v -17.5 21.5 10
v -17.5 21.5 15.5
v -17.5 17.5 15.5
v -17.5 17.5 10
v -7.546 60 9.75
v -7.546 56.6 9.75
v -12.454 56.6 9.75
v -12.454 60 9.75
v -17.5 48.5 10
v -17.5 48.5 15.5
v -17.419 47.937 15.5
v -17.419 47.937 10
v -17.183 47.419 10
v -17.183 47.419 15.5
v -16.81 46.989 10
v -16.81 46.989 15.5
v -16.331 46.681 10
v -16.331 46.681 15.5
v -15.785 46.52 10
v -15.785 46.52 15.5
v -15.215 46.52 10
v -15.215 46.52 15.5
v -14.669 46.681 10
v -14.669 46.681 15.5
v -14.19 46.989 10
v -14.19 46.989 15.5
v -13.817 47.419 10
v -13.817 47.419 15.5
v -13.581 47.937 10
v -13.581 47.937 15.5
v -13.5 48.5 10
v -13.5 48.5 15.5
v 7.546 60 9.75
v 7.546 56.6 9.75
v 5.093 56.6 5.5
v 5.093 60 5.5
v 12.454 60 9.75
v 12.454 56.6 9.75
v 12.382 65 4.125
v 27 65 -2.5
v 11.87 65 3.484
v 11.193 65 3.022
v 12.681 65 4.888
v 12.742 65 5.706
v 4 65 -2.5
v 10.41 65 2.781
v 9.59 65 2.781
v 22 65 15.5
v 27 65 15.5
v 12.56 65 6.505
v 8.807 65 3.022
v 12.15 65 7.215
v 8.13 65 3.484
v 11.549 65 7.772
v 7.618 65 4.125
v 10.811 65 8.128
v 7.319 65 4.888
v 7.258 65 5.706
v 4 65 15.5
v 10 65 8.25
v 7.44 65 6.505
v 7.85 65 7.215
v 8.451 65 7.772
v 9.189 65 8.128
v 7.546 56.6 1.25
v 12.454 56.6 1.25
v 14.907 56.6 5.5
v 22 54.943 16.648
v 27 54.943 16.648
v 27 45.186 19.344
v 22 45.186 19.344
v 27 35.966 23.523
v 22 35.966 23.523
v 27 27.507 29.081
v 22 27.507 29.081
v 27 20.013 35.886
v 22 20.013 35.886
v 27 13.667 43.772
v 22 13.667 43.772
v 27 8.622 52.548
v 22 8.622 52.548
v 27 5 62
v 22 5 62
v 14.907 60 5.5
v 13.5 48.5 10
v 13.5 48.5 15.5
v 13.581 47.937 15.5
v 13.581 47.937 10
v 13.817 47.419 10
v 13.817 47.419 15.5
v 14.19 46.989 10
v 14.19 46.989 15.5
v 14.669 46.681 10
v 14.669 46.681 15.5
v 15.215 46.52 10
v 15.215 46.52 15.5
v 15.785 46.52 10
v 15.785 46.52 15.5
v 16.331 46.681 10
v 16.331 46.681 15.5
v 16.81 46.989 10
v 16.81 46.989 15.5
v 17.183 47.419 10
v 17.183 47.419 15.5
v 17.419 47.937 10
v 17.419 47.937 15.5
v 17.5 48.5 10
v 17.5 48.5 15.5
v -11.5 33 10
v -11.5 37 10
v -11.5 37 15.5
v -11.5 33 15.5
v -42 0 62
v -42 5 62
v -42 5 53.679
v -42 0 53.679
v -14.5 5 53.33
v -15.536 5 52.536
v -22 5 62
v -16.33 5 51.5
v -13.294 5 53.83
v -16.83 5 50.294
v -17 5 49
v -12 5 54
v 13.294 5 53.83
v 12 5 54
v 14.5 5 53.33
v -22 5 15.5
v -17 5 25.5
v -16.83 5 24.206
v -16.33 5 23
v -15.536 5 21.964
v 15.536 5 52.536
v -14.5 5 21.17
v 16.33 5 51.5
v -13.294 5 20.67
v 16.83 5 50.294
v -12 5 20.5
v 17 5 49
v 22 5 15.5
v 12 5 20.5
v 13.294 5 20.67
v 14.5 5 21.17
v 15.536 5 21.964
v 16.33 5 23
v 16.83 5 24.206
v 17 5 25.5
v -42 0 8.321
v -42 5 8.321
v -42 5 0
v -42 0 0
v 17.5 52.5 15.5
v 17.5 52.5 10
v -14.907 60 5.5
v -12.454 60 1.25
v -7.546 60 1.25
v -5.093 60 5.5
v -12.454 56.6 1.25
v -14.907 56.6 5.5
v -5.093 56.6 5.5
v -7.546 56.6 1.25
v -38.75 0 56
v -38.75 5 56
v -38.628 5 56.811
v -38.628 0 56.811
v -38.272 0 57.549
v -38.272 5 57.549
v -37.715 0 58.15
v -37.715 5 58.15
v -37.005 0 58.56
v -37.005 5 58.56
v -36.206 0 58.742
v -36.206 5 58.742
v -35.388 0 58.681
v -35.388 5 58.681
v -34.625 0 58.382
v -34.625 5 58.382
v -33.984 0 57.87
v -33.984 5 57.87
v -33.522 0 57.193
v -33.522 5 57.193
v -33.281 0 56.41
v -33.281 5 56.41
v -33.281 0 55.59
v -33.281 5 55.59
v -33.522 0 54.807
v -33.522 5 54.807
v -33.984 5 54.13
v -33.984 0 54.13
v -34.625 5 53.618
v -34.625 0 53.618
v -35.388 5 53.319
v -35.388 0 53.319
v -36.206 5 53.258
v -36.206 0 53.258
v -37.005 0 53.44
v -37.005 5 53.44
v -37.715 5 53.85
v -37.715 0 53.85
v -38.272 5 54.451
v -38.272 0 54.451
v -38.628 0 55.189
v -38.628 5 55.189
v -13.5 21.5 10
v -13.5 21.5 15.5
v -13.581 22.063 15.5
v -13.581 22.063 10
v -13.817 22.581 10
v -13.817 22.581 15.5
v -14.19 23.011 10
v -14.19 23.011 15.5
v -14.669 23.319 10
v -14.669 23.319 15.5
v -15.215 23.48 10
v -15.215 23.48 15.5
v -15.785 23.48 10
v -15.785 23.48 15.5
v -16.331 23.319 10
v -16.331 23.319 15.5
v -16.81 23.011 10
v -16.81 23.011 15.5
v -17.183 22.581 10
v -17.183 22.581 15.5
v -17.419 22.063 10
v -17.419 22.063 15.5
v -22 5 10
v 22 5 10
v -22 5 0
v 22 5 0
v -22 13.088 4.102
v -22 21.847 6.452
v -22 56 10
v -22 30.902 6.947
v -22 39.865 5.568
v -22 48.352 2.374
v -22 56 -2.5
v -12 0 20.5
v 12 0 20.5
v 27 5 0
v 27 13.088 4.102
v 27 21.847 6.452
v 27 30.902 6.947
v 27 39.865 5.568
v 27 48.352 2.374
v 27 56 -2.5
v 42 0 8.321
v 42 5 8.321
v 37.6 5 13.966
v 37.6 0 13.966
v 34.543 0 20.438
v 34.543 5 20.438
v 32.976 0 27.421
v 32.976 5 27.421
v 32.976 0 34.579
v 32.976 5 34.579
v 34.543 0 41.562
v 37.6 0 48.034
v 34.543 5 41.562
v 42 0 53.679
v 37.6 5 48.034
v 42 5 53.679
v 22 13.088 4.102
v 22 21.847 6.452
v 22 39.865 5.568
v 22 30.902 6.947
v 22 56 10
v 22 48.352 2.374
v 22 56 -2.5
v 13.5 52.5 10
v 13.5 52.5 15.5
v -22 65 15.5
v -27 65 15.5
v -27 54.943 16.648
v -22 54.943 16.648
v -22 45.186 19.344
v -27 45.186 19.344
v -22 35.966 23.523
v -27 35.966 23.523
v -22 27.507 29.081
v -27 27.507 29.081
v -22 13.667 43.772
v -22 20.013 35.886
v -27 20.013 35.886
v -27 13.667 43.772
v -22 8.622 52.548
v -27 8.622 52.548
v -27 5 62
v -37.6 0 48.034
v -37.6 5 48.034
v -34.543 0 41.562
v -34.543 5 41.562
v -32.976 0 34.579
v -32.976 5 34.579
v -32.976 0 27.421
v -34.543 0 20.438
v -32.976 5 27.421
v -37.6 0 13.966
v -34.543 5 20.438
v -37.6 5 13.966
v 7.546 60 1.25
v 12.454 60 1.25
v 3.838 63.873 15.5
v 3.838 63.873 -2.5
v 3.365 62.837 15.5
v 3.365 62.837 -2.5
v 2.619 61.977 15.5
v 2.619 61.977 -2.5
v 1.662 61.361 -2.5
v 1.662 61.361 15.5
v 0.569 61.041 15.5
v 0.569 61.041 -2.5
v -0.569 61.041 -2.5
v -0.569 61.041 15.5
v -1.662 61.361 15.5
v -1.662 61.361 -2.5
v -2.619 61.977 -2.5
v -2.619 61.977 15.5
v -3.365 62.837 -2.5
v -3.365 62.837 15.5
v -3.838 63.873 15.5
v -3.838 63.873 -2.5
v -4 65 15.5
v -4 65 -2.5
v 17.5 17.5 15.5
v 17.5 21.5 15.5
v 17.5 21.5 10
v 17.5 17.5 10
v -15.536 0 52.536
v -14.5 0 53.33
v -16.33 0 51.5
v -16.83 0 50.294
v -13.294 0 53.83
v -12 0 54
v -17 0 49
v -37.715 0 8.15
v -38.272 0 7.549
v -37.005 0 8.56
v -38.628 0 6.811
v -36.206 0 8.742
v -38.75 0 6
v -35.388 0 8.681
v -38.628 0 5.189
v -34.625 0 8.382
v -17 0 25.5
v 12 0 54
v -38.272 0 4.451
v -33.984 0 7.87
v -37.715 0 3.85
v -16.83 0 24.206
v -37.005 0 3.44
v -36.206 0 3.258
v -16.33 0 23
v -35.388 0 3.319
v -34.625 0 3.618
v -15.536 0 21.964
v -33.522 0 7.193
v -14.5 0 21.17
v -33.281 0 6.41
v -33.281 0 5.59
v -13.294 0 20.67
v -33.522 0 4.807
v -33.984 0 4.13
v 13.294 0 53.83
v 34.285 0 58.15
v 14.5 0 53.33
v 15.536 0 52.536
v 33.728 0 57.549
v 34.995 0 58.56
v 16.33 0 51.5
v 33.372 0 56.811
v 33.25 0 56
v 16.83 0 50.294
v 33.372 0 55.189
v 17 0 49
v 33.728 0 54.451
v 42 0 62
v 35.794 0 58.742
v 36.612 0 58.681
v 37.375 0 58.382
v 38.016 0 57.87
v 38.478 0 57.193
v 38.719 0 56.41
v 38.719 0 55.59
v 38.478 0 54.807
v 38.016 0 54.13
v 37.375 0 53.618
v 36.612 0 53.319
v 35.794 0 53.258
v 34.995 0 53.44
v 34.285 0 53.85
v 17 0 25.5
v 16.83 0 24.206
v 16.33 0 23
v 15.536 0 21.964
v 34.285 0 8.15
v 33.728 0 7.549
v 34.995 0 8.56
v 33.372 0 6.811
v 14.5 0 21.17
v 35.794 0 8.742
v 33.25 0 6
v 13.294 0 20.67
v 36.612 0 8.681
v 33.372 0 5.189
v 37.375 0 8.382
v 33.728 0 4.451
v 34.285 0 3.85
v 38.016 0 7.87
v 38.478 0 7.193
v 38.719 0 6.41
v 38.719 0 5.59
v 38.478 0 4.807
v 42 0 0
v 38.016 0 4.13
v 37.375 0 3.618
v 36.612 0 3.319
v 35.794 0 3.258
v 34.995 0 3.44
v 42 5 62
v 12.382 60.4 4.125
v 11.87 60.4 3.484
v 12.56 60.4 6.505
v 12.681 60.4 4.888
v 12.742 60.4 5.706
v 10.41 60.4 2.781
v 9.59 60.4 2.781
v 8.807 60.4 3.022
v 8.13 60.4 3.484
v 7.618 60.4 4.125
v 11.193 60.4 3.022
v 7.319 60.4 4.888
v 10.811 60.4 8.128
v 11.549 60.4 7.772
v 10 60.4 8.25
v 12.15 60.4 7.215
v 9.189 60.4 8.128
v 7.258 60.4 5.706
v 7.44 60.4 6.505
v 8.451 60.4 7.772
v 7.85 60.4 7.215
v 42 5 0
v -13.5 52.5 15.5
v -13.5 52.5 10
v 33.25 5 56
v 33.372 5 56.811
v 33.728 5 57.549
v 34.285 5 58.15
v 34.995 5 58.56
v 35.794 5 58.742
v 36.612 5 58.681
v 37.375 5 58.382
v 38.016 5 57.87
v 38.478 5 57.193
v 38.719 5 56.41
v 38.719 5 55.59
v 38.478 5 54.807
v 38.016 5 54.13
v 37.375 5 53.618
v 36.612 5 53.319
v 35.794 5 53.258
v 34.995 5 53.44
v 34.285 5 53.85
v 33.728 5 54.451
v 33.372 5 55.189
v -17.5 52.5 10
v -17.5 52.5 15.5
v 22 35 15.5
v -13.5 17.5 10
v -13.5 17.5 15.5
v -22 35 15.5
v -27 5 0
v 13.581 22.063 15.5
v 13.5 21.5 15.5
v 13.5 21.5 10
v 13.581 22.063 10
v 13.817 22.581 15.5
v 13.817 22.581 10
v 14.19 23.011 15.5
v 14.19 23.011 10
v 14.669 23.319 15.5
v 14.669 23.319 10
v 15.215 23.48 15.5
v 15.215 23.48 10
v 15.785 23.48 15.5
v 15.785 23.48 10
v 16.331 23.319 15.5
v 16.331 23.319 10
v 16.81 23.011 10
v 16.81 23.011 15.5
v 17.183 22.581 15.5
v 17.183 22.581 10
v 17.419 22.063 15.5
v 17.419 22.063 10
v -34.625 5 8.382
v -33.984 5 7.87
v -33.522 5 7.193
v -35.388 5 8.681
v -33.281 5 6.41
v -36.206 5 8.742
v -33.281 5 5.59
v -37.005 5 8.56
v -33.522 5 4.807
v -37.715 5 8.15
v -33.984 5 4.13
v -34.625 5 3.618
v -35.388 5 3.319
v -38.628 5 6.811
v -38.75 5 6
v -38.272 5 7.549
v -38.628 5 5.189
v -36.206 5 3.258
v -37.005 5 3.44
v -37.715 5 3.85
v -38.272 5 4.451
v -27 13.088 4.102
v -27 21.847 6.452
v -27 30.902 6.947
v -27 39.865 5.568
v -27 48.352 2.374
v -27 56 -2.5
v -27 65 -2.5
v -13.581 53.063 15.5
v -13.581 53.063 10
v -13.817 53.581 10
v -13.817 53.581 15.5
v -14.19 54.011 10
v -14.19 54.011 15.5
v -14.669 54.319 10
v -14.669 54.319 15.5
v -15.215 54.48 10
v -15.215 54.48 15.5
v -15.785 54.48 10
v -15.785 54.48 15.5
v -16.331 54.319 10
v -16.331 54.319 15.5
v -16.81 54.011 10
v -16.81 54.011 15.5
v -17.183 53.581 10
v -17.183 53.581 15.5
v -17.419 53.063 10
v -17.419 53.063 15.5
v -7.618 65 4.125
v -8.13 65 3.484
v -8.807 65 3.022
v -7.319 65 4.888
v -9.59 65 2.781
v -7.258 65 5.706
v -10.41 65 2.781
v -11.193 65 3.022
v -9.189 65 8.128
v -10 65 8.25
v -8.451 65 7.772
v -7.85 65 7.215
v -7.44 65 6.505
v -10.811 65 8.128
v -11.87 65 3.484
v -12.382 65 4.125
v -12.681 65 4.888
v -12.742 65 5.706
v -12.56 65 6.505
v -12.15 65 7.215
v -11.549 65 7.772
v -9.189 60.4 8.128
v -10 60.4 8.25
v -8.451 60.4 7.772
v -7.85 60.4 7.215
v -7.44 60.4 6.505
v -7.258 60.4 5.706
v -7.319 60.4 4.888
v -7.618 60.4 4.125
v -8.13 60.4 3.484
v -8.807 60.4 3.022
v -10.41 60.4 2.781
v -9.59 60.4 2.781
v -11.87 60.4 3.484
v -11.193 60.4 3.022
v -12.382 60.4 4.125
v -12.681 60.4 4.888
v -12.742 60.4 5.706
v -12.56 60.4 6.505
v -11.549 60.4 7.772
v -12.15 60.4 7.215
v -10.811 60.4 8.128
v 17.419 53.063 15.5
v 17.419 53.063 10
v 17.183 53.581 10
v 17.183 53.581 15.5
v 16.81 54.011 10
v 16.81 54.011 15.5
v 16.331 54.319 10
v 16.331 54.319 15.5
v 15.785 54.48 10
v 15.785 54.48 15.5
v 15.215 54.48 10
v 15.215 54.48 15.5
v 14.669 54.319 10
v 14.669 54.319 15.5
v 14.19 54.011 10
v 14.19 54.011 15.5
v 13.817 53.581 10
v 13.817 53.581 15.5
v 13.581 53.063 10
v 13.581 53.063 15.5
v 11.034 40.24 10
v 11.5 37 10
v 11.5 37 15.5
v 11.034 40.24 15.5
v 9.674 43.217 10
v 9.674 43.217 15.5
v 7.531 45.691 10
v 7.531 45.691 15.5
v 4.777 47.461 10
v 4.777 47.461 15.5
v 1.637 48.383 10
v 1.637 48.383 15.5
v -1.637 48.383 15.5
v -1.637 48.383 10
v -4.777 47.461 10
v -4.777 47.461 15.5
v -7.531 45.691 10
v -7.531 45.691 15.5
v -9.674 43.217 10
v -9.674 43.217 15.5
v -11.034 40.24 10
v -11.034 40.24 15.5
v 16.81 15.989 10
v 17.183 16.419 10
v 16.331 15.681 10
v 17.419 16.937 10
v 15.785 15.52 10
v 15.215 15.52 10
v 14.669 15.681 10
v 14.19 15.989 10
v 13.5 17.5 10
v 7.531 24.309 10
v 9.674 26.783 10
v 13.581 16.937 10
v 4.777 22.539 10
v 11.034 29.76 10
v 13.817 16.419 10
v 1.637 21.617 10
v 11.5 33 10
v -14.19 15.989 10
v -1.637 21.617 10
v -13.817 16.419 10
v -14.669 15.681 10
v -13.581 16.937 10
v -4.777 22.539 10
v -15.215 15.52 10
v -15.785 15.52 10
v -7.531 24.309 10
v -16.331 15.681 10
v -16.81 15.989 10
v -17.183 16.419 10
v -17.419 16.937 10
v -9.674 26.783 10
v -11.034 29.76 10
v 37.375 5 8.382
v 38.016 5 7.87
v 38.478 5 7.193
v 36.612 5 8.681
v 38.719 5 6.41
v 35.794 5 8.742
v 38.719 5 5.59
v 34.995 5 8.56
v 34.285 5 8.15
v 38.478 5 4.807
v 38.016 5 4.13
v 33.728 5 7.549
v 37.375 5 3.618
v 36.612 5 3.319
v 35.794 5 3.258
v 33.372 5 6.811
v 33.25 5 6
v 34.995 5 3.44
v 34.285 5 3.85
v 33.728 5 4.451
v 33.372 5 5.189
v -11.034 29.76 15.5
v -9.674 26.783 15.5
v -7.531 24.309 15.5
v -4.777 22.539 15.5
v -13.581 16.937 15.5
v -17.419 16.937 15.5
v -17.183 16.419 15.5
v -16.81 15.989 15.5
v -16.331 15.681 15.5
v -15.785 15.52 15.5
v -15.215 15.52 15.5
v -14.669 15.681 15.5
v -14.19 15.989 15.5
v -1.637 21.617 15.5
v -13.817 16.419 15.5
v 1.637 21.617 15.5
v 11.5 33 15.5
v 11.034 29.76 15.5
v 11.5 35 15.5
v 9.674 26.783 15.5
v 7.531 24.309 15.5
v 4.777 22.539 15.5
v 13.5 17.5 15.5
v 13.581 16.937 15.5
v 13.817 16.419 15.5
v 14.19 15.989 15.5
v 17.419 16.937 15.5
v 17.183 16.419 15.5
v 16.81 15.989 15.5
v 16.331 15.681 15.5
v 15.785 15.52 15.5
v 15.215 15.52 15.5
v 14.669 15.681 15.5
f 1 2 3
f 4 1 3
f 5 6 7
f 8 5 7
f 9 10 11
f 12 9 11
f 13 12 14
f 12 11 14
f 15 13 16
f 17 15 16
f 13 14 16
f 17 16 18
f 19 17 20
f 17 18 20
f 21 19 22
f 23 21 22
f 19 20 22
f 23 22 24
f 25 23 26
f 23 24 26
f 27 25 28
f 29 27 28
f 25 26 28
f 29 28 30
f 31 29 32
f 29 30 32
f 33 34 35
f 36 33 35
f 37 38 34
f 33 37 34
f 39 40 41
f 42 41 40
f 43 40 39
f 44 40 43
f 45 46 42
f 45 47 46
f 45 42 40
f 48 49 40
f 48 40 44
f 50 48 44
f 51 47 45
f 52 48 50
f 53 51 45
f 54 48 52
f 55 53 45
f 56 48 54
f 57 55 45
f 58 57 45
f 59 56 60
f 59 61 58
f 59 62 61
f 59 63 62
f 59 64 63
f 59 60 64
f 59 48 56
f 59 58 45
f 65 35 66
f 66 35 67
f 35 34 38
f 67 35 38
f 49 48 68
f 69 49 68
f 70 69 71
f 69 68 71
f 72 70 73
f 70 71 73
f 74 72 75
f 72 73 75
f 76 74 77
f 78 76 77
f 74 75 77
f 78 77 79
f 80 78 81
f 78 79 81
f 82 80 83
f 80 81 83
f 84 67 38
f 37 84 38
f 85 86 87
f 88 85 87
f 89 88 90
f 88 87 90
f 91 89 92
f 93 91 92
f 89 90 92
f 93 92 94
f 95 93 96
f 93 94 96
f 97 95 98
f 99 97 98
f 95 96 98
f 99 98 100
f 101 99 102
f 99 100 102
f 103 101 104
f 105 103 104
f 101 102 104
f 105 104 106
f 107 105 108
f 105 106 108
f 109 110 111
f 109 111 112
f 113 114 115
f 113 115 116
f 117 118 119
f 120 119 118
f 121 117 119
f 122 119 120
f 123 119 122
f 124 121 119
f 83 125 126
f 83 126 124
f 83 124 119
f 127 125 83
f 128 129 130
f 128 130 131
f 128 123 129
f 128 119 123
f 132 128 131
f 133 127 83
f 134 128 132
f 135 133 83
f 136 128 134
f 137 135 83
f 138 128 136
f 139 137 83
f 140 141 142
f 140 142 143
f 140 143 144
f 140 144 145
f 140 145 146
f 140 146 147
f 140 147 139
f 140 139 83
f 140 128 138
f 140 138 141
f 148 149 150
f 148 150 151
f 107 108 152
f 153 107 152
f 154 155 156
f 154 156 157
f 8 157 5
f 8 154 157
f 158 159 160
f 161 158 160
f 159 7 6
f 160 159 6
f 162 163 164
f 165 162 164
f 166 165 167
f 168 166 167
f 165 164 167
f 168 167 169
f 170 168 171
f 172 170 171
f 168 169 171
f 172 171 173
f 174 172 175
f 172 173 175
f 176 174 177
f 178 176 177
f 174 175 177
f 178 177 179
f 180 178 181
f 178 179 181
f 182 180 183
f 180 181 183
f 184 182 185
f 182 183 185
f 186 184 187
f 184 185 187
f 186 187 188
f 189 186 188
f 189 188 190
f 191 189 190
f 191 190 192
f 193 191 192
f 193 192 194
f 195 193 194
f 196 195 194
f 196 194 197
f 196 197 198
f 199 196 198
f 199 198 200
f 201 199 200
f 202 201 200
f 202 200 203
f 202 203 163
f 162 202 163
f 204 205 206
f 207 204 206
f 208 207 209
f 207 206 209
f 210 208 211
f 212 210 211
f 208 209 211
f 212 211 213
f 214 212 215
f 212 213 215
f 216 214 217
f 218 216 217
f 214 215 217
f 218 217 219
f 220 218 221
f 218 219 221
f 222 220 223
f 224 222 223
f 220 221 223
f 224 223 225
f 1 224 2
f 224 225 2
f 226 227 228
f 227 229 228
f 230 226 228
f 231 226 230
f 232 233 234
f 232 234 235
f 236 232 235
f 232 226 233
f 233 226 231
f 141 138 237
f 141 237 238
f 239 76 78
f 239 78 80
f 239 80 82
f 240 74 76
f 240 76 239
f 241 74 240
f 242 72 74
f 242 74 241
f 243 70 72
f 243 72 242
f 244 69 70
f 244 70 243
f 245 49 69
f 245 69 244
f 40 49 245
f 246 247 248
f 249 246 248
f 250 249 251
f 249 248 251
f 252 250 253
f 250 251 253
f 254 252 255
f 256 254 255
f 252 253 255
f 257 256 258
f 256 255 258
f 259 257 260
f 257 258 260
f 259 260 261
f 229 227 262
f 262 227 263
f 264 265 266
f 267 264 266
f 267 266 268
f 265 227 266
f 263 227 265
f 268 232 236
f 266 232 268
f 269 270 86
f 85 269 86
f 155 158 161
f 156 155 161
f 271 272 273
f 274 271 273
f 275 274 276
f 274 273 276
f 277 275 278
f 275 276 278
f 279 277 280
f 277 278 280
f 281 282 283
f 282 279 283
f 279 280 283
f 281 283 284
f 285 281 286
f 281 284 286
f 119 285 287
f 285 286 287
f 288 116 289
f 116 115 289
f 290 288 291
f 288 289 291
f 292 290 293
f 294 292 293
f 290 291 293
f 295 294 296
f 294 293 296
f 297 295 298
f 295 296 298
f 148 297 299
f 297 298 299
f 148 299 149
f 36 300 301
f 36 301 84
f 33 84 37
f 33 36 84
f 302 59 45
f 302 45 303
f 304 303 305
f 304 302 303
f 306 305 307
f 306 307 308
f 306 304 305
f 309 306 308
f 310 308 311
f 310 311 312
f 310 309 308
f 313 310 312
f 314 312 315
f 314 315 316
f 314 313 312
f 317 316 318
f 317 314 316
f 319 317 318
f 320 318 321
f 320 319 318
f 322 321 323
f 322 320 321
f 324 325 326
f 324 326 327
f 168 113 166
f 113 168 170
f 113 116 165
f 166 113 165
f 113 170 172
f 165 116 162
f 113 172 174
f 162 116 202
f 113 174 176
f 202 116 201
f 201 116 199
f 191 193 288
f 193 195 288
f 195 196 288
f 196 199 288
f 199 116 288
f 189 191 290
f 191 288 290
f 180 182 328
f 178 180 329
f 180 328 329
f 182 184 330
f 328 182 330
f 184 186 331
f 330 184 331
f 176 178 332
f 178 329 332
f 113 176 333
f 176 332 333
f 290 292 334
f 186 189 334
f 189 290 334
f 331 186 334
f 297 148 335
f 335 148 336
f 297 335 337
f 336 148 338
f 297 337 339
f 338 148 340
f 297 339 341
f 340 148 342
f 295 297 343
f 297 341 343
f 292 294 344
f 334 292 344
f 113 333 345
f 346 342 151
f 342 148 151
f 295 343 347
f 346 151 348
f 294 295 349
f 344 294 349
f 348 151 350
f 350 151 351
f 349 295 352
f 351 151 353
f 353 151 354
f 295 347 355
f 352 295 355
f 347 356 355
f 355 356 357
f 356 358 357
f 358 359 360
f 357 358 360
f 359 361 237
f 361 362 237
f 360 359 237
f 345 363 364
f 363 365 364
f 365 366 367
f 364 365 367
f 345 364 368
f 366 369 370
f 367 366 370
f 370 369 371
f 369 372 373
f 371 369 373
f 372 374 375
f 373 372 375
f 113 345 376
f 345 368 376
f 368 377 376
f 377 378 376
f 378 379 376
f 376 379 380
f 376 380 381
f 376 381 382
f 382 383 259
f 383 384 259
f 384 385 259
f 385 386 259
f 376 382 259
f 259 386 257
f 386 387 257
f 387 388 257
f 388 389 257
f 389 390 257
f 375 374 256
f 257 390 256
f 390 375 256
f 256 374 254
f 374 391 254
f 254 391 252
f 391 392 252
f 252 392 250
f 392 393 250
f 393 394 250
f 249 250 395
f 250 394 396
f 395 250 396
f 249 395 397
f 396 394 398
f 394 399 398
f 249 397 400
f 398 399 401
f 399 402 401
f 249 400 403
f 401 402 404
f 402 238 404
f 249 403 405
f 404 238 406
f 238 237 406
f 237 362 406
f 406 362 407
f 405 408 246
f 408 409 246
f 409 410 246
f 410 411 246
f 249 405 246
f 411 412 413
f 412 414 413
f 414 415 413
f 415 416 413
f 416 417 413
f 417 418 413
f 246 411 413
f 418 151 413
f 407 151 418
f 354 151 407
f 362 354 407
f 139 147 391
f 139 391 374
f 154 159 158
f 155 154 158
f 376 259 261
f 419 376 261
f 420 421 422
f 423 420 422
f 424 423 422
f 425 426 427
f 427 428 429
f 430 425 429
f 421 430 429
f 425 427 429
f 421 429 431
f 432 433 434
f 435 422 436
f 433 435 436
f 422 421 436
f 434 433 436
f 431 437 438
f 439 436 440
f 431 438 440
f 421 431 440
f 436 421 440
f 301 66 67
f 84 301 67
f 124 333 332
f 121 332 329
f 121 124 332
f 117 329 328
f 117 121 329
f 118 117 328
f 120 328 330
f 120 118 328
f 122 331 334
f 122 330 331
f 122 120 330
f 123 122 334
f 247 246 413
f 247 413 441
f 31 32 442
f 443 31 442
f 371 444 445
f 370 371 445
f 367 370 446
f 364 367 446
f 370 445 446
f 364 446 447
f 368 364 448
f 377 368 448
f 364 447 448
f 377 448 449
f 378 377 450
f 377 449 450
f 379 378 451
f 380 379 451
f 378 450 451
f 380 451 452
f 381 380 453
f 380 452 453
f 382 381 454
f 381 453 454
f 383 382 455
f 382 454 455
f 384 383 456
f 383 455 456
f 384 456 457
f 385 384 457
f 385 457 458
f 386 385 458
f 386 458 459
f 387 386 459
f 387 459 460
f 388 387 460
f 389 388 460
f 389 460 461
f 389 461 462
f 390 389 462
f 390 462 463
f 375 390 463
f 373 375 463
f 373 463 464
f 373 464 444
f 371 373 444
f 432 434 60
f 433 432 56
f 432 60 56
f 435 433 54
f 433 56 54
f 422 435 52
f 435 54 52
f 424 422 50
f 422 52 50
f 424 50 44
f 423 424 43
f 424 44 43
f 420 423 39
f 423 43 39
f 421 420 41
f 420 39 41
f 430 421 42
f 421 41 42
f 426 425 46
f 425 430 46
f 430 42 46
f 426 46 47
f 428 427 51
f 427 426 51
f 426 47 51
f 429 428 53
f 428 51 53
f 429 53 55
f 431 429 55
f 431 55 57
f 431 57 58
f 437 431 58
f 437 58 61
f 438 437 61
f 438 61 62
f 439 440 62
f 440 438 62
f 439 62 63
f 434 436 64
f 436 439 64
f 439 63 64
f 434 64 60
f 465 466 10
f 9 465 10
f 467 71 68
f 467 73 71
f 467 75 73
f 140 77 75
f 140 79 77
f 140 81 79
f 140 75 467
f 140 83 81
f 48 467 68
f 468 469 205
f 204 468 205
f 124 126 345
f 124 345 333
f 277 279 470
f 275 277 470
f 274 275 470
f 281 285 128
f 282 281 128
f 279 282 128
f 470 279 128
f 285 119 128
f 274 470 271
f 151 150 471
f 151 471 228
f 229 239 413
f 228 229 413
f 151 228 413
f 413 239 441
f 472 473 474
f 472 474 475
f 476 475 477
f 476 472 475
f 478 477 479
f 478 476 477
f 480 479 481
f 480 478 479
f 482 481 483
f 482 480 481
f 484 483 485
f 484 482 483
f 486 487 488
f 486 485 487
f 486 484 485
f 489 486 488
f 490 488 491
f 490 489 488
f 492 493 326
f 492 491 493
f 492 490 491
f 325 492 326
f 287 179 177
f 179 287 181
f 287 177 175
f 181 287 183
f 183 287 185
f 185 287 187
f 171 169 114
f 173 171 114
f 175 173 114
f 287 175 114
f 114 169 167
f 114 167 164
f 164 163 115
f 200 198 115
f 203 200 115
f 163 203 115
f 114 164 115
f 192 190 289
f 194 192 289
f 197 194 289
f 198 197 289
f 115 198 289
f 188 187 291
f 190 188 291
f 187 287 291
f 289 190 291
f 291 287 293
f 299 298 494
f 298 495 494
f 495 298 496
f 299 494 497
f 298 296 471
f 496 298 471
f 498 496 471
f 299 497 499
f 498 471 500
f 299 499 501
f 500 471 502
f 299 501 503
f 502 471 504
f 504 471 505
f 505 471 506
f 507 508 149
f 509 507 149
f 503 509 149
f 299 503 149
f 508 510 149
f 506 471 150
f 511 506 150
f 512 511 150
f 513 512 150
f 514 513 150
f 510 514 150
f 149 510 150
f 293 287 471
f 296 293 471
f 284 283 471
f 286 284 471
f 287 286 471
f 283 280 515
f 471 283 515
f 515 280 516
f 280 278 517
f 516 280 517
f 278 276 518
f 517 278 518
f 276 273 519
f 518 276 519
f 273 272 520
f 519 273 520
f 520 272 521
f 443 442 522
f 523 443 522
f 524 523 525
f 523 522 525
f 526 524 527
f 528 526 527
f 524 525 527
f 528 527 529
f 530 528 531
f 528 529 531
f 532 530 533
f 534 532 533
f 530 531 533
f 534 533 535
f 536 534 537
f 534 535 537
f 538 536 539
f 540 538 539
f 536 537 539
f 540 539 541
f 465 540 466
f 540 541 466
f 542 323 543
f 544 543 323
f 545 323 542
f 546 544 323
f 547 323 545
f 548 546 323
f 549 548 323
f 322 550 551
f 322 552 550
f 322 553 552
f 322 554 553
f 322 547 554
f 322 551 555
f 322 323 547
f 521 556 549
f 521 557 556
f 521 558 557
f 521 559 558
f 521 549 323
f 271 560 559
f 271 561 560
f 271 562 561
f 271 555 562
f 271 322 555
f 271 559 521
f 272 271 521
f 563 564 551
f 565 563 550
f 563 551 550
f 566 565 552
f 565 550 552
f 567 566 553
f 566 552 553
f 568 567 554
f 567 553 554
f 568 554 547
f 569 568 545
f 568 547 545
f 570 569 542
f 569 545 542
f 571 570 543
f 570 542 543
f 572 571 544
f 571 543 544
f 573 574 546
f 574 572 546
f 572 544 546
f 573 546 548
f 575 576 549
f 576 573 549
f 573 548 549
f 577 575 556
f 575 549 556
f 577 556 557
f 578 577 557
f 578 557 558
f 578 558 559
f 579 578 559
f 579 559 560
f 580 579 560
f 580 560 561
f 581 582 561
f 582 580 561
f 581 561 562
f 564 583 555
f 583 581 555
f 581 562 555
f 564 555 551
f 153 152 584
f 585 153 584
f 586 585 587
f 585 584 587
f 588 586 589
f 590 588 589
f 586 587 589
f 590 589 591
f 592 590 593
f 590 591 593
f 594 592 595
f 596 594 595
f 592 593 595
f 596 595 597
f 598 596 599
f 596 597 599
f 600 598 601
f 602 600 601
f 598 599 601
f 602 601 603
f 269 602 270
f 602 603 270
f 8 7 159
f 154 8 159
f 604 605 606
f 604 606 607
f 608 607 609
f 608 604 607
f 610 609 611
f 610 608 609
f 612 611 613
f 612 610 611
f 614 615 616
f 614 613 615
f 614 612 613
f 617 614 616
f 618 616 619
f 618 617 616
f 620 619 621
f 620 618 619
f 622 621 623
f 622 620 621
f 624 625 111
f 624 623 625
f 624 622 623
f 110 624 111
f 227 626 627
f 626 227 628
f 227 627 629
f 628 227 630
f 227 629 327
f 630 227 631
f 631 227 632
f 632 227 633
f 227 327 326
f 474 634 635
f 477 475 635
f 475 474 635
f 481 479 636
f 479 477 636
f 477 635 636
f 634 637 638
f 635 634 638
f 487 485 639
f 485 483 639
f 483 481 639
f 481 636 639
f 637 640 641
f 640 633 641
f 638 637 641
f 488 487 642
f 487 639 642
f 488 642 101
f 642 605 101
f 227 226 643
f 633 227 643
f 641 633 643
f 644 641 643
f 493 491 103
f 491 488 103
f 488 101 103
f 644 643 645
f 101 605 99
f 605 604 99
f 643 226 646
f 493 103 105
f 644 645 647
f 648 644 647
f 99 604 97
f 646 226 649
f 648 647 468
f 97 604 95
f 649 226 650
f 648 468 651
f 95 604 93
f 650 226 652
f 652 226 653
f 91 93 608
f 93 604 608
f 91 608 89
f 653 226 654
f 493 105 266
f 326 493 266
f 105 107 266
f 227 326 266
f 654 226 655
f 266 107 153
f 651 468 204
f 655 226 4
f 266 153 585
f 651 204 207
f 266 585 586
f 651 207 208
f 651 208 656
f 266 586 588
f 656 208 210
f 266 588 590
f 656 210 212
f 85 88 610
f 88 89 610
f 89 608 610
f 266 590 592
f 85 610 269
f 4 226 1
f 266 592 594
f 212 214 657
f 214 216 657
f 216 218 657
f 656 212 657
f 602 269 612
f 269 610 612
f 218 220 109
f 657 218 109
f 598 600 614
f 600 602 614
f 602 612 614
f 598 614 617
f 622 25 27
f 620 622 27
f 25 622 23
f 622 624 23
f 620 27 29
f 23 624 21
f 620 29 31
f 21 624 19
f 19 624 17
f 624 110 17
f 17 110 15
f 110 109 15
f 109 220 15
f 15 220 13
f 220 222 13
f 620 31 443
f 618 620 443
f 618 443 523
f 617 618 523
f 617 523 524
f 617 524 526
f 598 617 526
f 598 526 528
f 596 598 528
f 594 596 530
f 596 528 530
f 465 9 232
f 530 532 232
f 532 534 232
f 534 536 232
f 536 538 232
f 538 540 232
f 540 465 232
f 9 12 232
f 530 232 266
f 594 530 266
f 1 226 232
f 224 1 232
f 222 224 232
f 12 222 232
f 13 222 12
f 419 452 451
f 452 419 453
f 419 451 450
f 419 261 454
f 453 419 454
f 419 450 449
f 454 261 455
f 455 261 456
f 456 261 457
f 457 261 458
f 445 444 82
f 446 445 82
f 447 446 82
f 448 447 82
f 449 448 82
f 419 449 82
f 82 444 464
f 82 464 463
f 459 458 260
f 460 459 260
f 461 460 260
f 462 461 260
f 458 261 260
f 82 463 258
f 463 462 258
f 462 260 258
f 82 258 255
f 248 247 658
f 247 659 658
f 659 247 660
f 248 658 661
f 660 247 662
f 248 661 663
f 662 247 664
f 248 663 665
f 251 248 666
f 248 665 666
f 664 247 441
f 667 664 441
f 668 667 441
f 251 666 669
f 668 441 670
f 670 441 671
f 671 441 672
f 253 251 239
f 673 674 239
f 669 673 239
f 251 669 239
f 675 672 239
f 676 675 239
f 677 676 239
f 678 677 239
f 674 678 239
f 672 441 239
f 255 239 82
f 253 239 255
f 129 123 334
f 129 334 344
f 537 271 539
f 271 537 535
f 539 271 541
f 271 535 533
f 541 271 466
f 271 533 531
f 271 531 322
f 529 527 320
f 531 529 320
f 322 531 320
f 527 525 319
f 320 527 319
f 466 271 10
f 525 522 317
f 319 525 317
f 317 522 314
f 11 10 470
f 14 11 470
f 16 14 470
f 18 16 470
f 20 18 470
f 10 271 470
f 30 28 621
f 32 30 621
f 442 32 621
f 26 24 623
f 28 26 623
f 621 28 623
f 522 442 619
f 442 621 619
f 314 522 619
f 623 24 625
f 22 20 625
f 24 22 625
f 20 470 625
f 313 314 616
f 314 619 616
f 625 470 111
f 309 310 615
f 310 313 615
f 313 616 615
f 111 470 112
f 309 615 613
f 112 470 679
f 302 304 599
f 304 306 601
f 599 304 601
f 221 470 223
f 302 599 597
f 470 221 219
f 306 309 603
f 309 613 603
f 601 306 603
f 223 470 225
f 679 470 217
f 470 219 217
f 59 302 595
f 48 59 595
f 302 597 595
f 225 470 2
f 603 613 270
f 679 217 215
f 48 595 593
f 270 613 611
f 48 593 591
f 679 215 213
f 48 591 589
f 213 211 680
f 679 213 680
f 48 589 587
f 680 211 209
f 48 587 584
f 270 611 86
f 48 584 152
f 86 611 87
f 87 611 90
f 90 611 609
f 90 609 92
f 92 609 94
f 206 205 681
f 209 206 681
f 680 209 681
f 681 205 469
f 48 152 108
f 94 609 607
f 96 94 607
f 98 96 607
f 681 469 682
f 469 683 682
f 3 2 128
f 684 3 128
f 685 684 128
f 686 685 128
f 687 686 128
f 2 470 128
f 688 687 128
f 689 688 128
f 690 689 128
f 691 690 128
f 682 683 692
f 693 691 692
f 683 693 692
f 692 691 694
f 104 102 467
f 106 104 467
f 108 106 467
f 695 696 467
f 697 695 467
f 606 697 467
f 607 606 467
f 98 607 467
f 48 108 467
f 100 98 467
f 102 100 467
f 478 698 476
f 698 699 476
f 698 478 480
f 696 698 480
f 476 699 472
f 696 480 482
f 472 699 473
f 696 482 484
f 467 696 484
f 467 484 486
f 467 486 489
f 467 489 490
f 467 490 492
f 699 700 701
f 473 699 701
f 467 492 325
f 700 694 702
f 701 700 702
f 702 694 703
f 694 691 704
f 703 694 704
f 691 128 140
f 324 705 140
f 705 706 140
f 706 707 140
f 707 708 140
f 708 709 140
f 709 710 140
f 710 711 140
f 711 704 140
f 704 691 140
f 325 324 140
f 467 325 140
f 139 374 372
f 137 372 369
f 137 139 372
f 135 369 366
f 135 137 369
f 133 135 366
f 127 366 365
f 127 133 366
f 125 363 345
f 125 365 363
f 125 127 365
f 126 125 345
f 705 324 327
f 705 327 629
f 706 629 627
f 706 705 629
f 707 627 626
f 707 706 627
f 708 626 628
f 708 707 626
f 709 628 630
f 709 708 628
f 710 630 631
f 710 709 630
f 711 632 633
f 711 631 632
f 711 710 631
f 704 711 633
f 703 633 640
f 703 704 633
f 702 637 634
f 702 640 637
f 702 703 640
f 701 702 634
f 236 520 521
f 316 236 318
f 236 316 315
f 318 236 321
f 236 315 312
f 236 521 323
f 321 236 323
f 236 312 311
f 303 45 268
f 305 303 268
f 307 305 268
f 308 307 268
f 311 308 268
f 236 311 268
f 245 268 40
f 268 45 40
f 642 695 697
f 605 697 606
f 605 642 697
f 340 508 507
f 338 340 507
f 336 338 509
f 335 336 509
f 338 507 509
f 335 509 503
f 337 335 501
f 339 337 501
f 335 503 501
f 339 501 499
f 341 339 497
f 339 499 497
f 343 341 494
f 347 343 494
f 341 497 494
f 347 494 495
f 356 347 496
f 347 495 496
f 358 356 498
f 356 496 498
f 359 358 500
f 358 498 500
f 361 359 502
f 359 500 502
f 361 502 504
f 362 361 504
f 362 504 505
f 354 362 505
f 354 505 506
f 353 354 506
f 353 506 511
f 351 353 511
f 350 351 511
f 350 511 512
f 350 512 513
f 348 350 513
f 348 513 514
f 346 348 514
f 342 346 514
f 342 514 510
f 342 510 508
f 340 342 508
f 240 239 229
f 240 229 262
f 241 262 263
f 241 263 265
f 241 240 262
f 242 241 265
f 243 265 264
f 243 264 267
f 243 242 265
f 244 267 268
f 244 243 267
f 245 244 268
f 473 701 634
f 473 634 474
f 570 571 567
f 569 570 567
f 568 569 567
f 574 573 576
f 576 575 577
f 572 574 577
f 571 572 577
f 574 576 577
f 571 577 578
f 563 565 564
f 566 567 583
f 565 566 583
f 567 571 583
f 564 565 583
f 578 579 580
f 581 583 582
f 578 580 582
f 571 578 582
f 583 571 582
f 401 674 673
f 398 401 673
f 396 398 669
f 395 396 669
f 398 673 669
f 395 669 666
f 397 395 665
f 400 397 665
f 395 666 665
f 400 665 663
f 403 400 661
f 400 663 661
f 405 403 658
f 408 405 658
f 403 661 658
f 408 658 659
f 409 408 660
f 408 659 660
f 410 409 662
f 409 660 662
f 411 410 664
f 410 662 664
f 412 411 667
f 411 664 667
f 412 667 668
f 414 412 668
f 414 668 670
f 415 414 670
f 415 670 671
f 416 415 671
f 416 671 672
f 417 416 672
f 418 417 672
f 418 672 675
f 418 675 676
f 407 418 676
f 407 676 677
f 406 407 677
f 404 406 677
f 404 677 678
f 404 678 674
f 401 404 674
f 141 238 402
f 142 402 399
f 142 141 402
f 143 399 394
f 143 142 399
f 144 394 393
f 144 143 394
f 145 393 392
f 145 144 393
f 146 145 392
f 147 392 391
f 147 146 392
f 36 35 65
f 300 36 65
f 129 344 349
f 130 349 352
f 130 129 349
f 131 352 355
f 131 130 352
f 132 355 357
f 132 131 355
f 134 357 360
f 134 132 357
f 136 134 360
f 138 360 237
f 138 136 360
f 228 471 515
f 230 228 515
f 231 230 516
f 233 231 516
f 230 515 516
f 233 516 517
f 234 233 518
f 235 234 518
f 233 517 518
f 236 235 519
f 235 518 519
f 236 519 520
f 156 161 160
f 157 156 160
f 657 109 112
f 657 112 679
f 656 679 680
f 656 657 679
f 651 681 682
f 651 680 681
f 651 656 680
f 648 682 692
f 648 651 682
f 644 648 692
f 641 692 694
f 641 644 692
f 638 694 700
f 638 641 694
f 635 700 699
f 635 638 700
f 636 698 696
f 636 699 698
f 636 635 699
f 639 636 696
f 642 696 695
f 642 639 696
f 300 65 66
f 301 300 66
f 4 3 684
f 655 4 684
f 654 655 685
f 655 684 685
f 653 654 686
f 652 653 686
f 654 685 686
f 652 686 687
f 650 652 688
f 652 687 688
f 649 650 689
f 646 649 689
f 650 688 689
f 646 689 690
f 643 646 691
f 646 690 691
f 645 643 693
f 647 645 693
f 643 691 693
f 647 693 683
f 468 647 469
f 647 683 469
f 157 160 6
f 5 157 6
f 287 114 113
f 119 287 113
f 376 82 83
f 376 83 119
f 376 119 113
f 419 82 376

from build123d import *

# Parameters (mm, degrees)
BOSS_EXTRUDE1_DEPTH = 62
SKETCH2_W           = 10
SKETCH2_H           = 60
CUT_EXTRUDE1_DEPTH  = 85
SKETCH12_W          = 44
SKETCH12_H          = 51.120506265
CUT_EXTRUDE11_DEPTH = 30
SKETCH17_R          = 2.75
SKETCH17_R_2        = 32.5
CUT_EXTRUDE14_DEPTH = 6
CUT_EXTRUDE17_DEPTH = 10
CUT_EXTRUDE18_DEPTH = 6
SKETCH24_W          = 44
SKETCH24_H          = 8.565563784
CUT_EXTRUDE19_DEPTH = 31.0000001
BOSS_EXTRUDE2_DEPTH = 12.5
BOSS_EXTRUDE3_DEPTH = 5
CUT_EXTRUDE20_START = -0.6
CUT_EXTRUDE20_DEPTH = 3.4
SKETCH29_R          = 2.75
CUT_EXTRUDE21_DEPTH = 6
SKETCH33_R          = 2.75
BOSS_EXTRUDE5_DEPTH = 0.4


with BuildPart() as part:
    # Sketch1 → Boss-Extrude1 (new body)
    with BuildSketch(Plane.XY):
        with BuildLine():
            Line((-42, 0), (42, 0))
            Line((42, 0), (42, 5))
            Line((42, 5), (27, 5))
            Line((27, 5), (27, 65))
            Line((27, 65), (4, 65))
            ThreePointArc((4, 65), (0, 61), (-4, 65))
            Line((-4, 65), (-27, 65))
            Line((-27, 65), (-27, 5))
            Line((-27, 5), (-42, 5))
            Line((-42, 5), (-42, 0))
        make_face()
        with BuildLine():
            Line((-11.5, 37), (-11.5, 33))
            ThreePointArc((-11.5, 33), (0, 21.5), (11.5, 33))
            Line((11.5, 33), (11.5, 37))
            ThreePointArc((11.5, 37), (0, 48.5), (-11.5, 37))
        make_face(mode=Mode.SUBTRACT)
    extrude(amount=BOSS_EXTRUDE1_DEPTH)

    # Sketch2 → Cut-Extrude1 (cut, through all)
    with BuildSketch(Plane.ZY.offset(42)):
        with Locations((5, 35)):
            Rectangle(SKETCH2_W, SKETCH2_H)
        with BuildLine():
            Line((62, 5), (62, 65))
            Line((62, 65), (15.5, 65))
            ThreePointArc((15.5, 65), (29.081460906, 27.506882202), (62, 5))
        make_face()
    extrude(amount=-CUT_EXTRUDE1_DEPTH, mode=Mode.SUBTRACT)

    # Sketch12 → Cut-Extrude11 (cut)
    with BuildSketch(Plane(origin=(0, 5, 0), x_dir=(1, 0, 0), z_dir=(0, 1, 0))):
        with Locations((0, -41.060253133)):
            Rectangle(SKETCH12_W, SKETCH12_H)
    extrude(amount=CUT_EXTRUDE11_DEPTH, mode=Mode.SUBTRACT)

    # Sketch17 → Cut-Extrude14 (cut, through all)
    with BuildSketch(Plane(origin=(0, 5, 0), x_dir=(1, 0, 0), z_dir=(0, 1, 0))):
        with Locations(Location((-36, -6, 0), (0, 0, 180))):  # turned: the seam where the file's is
            Circle(SKETCH17_R)
        with Locations(Location((36, -6, 0), (0, 0, 180))):  # turned: the seam where the file's is
            Circle(SKETCH17_R)
        with Locations(Location((36, -56, 0), (0, 0, 180))):  # turned: the seam where the file's is
            Circle(SKETCH17_R)
        with Locations(Location((-36, -56, 0), (0, 0, 180))):  # turned: the seam where the file's is
            Circle(SKETCH17_R)
        with Locations((65.278831944, -31)):
            Circle(SKETCH17_R_2)
        with Locations((-65.278831944, -31)):
            Circle(SKETCH17_R_2)
    extrude(amount=-CUT_EXTRUDE14_DEPTH, mode=Mode.SUBTRACT)

    # Sketch20 → Cut-Extrude17 (cut)
    with BuildSketch(Plane.XY.offset(15.5)):
        with BuildLine():
            Line((-17.5, 52.5), (-17.5, 48.5))
            ThreePointArc((-17.5, 48.5), (-15.5, 46.5), (-13.5, 48.5))
            Line((-13.5, 48.5), (-13.5, 52.5))
            ThreePointArc((-13.5, 52.5), (-15.5, 54.5), (-17.5, 52.5))
        make_face()
        with BuildLine():
            Line((13.5, 52.5), (13.5, 48.5))
            ThreePointArc((13.5, 48.5), (15.5, 46.5), (17.5, 48.5))
            Line((17.5, 48.5), (17.5, 52.5))
            ThreePointArc((17.5, 52.5), (15.5, 54.5), (13.5, 52.5))
        make_face()
        with BuildLine():
            Line((-17.5, 21.5), (-17.5, 17.5))
            ThreePointArc((-17.5, 17.5), (-15.5, 15.5), (-13.5, 17.5))
            Line((-13.5, 17.5), (-13.5, 21.5))
            ThreePointArc((-13.5, 21.5), (-15.5, 23.5), (-17.5, 21.5))
        make_face()
        with BuildLine():
            Line((13.5, 17.5), (13.5, 21.5))
            ThreePointArc((13.5, 21.5), (15.5, 23.5), (17.5, 21.5))
            Line((17.5, 21.5), (17.5, 17.5))
            ThreePointArc((17.5, 17.5), (15.5, 15.5), (13.5, 17.5))
        make_face()
    extrude(amount=-CUT_EXTRUDE17_DEPTH, mode=Mode.SUBTRACT)

    # Sketch21 → Cut-Extrude18 (cut, through all)
    with BuildSketch(Plane(origin=(0, 5, 0), x_dir=(1, 0, 0), z_dir=(0, 1, 0))):
        with BuildLine():
            Line((-12, -20.5), (12, -20.5))
            ThreePointArc((12, -20.5), (15.535533906, -21.964466094), (17, -25.5))
            Line((17, -25.5), (17, -49))
            ThreePointArc((17, -49), (15.535533906, -52.535533906), (12, -54))
            Line((12, -54), (-12, -54))
            ThreePointArc((-12, -54), (-15.535533906, -52.535533906), (-17, -49))
            Line((-17, -49), (-17, -25.5))
            ThreePointArc((-17, -25.5), (-15.535533906, -21.964466094), (-12, -20.5))
        make_face()
    extrude(amount=-CUT_EXTRUDE18_DEPTH, mode=Mode.SUBTRACT)

    # Sketch24 → Cut-Extrude19 (cut, through all)
    with BuildSketch(Plane.XZ.offset(-35)):
        with Locations((0, 19.782781892)):
            Rectangle(SKETCH24_W, SKETCH24_H)
    extrude(amount=-CUT_EXTRUDE19_DEPTH, mode=Mode.SUBTRACT)

    # Sketch25 → Boss-Extrude2 (add)
    with BuildSketch(Plane(origin=(0, 0, 10), x_dir=(-1, 0, 0), z_dir=(0, 0, -1))):
        with BuildLine():
            Line((-27, 65), (-4, 65))
            ThreePointArc((-4, 65), (0, 61), (4, 65))
            Line((4, 65), (27, 65))
            Line((27, 65), (27, 56))
            Line((27, 56), (-27, 56))
            Line((-27, 56), (-27, 65))
        make_face()
    extrude(amount=BOSS_EXTRUDE2_DEPTH)

    # Sketch27 → Boss-Extrude3 (add)
    with BuildSketch(Plane.ZY.offset(27)):
        with BuildLine():
            Line((-2.5, 56), (10, 56))
            Line((10, 56), (10, 5))
            Line((10, 5), (0, 5))
            ThreePointArc((0, 5), (6.947455101, 30.901836034), (-2.5, 56))
        make_face()
    boss_extrude3 = extrude(amount=-BOSS_EXTRUDE3_DEPTH)

    # Mirror1: Boss-Extrude3 across plane
    add(boss_extrude3.mirror(Plane(origin=(0, 0, 0), x_dir=(0, 0, 1), z_dir=(1, 0, 0))))

    # Sketch28 → Cut-Extrude20 (cut)
    with BuildSketch(Plane.XZ.offset(-56).offset(CUT_EXTRUDE20_START)):
        Polygon((-5.092522712, 5.5), (-7.546261356, 9.75), (-12.453738644, 9.75), (-14.907477288, 5.5), (-12.453738644, 1.25), (-7.546261356, 1.25), align=None)
        Polygon((5.092522712, 5.5), (7.546261356, 1.25), (12.453738644, 1.25), (14.907477288, 5.5), (12.453738644, 9.75), (7.546261356, 9.75), align=None)
    extrude(amount=-CUT_EXTRUDE20_DEPTH, mode=Mode.SUBTRACT)

    # Sketch29 → Cut-Extrude21 (cut)
    with BuildSketch(Plane(origin=(0, 65, 0), x_dir=(1, 0, 0), z_dir=(0, 1, 0))):
        with Locations(Location((-10, -5.5, 0), (0, 0, 270))):  # turned: the seam where the file's is
            Circle(SKETCH29_R)
        with Locations(Location((10, -5.5, 0), (0, 0, 270))):  # turned: the seam where the file's is
            Circle(SKETCH29_R)
    extrude(amount=-CUT_EXTRUDE21_DEPTH, mode=Mode.SUBTRACT)

    # Sketch33 → Boss-Extrude5 (add)
    with BuildSketch(Plane.XZ.offset(-60)):
        with Locations(Location((10, 5.5, 0), (0, 0, 90))):  # turned: the seam where the file's is
            Circle(SKETCH33_R)
        with Locations(Location((-10, 5.5, 0), (0, 0, 90))):  # turned: the seam where the file's is
            Circle(SKETCH33_R)
    extrude(amount=-BOSS_EXTRUDE5_DEPTH)


solid = part.part
